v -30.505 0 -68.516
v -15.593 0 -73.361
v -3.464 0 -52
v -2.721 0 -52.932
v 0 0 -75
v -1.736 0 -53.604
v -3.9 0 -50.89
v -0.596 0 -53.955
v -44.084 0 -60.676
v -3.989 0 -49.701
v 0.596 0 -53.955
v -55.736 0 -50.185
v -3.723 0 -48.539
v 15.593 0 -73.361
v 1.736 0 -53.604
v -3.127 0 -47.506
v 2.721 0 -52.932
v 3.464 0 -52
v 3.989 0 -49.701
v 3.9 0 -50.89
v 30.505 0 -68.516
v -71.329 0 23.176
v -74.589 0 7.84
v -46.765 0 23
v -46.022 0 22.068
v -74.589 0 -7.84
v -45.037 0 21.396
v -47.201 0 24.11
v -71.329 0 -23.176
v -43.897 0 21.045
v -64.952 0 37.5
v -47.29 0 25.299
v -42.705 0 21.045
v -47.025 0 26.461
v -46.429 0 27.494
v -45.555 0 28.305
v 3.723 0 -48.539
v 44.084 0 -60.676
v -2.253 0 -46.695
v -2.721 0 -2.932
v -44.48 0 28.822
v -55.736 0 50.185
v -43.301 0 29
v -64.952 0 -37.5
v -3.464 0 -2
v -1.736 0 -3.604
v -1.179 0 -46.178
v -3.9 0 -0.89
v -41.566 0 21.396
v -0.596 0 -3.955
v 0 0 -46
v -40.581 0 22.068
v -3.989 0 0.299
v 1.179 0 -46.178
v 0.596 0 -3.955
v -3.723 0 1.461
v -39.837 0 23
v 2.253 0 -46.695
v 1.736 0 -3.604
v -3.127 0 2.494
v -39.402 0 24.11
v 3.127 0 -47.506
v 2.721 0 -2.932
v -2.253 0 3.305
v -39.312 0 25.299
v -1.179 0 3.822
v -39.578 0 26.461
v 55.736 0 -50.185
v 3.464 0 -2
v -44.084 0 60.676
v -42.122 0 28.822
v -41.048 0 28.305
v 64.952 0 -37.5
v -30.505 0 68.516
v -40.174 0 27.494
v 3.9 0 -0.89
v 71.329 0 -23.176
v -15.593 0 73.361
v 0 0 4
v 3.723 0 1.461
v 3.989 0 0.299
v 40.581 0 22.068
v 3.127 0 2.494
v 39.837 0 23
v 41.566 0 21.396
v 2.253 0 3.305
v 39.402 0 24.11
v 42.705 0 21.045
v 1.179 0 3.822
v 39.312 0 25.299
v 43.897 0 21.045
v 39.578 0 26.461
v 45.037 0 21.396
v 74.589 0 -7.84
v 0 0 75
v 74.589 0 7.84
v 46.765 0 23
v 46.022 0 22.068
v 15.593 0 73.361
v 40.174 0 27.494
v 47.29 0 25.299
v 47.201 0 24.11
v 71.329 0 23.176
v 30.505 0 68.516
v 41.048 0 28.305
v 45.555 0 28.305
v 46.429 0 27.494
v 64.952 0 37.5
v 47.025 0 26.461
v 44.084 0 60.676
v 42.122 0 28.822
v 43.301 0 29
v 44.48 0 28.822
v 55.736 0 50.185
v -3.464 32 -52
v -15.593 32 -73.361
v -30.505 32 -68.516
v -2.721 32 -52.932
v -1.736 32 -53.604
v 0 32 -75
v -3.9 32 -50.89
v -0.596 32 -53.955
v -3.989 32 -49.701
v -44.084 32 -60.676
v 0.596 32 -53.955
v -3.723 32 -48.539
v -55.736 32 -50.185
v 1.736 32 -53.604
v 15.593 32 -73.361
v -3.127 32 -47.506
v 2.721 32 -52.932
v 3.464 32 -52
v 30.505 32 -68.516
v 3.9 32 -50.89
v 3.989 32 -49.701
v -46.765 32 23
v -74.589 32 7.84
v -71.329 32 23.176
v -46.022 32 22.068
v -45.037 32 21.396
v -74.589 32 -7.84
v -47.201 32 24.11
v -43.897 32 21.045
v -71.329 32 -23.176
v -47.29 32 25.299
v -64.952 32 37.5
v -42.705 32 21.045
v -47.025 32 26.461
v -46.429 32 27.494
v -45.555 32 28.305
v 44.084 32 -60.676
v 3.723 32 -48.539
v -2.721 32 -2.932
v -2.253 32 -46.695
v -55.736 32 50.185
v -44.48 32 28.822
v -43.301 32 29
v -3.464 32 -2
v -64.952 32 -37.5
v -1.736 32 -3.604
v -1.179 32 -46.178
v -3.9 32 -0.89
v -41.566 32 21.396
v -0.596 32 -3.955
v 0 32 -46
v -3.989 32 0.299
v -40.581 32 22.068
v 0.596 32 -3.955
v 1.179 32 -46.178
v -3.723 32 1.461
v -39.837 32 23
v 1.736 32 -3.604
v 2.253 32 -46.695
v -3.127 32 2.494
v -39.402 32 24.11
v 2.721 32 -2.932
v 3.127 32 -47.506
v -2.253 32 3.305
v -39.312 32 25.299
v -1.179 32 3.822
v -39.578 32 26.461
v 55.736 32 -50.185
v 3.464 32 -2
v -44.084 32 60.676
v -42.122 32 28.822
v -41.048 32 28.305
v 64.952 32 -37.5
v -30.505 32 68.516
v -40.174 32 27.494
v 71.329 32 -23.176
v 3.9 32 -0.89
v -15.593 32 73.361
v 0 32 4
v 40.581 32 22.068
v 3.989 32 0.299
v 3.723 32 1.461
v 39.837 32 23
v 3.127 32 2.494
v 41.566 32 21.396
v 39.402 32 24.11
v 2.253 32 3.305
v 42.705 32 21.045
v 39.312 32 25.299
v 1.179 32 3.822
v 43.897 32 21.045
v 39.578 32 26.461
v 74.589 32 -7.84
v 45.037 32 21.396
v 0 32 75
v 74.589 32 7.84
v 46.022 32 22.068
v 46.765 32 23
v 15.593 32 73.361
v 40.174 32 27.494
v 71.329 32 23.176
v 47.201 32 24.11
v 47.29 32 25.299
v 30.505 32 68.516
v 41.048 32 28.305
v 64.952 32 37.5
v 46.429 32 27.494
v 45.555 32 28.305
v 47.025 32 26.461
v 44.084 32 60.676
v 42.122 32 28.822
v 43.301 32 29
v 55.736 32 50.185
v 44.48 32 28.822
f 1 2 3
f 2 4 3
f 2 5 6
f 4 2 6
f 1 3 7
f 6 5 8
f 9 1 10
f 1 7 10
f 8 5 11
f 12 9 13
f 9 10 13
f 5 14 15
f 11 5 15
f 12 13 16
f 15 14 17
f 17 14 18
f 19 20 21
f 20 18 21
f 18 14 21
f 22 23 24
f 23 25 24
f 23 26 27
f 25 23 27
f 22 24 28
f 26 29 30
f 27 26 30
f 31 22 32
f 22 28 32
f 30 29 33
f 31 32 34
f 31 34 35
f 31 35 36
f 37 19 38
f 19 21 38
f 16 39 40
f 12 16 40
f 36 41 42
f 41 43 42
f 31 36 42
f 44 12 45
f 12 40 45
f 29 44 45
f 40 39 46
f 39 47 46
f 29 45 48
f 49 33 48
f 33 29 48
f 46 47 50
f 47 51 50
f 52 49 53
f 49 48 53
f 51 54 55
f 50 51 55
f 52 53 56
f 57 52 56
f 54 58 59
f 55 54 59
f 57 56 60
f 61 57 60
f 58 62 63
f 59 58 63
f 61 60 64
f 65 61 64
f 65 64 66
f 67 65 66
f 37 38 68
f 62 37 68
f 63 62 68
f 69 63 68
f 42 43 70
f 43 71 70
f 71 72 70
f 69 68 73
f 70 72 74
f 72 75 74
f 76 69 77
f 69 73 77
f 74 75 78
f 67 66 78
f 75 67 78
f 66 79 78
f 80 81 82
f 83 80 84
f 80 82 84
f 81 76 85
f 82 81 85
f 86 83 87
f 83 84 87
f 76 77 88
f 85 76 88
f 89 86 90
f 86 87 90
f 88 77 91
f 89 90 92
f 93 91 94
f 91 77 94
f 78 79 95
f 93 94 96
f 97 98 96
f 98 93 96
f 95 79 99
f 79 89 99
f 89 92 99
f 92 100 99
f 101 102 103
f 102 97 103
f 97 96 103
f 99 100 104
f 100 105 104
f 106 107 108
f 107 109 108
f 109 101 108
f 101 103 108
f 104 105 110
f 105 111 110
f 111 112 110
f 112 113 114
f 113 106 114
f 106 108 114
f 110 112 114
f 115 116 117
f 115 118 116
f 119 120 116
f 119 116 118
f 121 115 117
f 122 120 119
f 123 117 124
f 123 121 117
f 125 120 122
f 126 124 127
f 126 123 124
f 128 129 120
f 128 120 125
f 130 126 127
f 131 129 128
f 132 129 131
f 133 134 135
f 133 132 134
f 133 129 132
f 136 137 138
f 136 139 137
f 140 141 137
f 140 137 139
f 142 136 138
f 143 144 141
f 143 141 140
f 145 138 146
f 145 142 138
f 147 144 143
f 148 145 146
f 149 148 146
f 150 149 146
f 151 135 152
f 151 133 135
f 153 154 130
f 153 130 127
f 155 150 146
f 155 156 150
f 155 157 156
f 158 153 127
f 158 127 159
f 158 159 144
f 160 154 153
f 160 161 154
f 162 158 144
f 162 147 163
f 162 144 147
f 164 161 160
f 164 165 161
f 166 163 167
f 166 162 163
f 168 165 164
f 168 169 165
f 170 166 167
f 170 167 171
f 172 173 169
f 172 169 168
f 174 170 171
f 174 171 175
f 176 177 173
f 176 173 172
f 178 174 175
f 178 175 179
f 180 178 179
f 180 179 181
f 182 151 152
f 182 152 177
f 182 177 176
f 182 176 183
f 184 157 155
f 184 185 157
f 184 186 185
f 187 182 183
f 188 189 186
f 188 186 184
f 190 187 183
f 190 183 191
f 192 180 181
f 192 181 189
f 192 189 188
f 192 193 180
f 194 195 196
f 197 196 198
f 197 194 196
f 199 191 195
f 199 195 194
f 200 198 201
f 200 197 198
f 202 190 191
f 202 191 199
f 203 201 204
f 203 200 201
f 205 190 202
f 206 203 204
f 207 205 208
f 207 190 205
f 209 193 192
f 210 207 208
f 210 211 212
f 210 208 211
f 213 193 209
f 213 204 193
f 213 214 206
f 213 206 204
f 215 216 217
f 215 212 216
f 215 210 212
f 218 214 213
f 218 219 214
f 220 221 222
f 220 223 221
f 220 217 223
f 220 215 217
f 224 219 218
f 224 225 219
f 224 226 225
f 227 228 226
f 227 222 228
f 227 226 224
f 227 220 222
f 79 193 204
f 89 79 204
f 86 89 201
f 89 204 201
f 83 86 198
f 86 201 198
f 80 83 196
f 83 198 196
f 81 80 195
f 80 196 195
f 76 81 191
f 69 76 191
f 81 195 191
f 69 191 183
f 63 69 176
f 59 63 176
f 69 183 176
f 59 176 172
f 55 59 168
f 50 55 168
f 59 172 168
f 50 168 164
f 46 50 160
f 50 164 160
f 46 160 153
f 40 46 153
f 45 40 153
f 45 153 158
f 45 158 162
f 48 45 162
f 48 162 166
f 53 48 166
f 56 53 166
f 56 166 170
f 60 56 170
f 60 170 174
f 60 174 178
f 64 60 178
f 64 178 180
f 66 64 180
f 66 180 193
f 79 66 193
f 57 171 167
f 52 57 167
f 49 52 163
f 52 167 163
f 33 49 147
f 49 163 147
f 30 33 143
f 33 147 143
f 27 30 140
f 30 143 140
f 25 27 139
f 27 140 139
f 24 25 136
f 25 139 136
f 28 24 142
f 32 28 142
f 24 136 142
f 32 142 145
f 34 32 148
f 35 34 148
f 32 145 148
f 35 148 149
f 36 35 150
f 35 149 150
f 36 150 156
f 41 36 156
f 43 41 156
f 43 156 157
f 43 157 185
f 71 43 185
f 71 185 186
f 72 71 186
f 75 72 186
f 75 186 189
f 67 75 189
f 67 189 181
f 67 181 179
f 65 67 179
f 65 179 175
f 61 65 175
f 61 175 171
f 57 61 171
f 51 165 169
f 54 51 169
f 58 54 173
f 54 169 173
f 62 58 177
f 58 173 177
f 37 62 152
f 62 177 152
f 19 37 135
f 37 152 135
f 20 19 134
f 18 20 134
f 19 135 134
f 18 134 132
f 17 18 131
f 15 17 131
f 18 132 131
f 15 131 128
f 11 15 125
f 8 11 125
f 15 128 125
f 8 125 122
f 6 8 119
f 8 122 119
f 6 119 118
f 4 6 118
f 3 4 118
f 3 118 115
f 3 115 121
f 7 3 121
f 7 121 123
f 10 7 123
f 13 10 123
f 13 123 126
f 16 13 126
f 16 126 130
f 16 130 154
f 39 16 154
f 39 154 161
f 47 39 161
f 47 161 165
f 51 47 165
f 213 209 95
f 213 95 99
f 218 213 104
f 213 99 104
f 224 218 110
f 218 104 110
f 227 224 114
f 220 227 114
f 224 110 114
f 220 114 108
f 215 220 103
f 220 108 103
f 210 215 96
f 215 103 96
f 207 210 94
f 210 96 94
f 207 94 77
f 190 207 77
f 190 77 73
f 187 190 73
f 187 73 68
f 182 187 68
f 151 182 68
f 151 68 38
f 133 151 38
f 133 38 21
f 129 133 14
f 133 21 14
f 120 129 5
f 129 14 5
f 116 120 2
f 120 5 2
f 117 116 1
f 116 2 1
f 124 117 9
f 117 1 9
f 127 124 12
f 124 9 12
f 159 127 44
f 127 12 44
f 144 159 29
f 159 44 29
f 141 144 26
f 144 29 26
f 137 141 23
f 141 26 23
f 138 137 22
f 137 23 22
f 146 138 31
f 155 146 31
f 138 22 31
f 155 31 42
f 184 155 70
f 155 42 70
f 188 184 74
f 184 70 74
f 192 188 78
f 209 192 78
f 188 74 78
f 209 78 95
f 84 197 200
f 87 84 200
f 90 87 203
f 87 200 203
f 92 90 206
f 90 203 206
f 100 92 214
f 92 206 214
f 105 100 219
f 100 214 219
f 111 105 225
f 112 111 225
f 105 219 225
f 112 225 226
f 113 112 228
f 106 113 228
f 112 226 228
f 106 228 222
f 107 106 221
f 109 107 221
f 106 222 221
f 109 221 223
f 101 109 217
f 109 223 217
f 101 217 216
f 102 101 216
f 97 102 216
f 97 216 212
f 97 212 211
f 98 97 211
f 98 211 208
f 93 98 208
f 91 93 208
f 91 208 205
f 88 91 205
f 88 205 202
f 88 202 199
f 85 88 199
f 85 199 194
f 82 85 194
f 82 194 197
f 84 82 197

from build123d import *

# Parameters (mm, degrees)
SKETCH1_R           = 75
BOSS_EXTRUDE1_DEPTH = 32
SKETCH2_R           = 4
CUT_EXTRUDE1_DEPTH  = 111.788086002
CIRPATTERN1_COUNT   = 3
SKETCH3_R           = 4
CUT_EXTRUDE2_DEPTH  = 111.788086002


with BuildPart() as part:
    # Sketch1 → Boss-Extrude1 (new body)
    with BuildSketch(Plane(origin=(0, 0, 0), x_dir=(1, 0, 0), z_dir=(0, 1, 0))):
        Circle(SKETCH1_R)
    extrude(amount=BOSS_EXTRUDE1_DEPTH)

    # Sketch2 → Cut-Extrude1 (cut, through all)
    with BuildSketch(Plane(origin=(0, 32, 0), x_dir=(1, 0, 0), z_dir=(0, 1, 0))):
        with Locations((0, 50)):
            Circle(SKETCH2_R)
    cut_extrude1 = extrude(amount=-CUT_EXTRUDE1_DEPTH, mode=Mode.SUBTRACT)

    # CirPattern1: Cut-Extrude1 ×3 about axis
    cirpattern1_axis = Axis((0, 33.6, 0), (0, -1, 0))
    for i in range(1, CIRPATTERN1_COUNT):
        add(cut_extrude1.rotate(cirpattern1_axis, i * 360 / CIRPATTERN1_COUNT), mode=Mode.SUBTRACT)

    # Sketch3 → Cut-Extrude2 (cut, through all)
    with BuildSketch(Plane(origin=(0, 32, 0), x_dir=(1, 0, 0), z_dir=(0, 1, 0))):
        Circle(SKETCH3_R)
    extrude(amount=-CUT_EXTRUDE2_DEPTH, mode=Mode.SUBTRACT)


solid = part.part
